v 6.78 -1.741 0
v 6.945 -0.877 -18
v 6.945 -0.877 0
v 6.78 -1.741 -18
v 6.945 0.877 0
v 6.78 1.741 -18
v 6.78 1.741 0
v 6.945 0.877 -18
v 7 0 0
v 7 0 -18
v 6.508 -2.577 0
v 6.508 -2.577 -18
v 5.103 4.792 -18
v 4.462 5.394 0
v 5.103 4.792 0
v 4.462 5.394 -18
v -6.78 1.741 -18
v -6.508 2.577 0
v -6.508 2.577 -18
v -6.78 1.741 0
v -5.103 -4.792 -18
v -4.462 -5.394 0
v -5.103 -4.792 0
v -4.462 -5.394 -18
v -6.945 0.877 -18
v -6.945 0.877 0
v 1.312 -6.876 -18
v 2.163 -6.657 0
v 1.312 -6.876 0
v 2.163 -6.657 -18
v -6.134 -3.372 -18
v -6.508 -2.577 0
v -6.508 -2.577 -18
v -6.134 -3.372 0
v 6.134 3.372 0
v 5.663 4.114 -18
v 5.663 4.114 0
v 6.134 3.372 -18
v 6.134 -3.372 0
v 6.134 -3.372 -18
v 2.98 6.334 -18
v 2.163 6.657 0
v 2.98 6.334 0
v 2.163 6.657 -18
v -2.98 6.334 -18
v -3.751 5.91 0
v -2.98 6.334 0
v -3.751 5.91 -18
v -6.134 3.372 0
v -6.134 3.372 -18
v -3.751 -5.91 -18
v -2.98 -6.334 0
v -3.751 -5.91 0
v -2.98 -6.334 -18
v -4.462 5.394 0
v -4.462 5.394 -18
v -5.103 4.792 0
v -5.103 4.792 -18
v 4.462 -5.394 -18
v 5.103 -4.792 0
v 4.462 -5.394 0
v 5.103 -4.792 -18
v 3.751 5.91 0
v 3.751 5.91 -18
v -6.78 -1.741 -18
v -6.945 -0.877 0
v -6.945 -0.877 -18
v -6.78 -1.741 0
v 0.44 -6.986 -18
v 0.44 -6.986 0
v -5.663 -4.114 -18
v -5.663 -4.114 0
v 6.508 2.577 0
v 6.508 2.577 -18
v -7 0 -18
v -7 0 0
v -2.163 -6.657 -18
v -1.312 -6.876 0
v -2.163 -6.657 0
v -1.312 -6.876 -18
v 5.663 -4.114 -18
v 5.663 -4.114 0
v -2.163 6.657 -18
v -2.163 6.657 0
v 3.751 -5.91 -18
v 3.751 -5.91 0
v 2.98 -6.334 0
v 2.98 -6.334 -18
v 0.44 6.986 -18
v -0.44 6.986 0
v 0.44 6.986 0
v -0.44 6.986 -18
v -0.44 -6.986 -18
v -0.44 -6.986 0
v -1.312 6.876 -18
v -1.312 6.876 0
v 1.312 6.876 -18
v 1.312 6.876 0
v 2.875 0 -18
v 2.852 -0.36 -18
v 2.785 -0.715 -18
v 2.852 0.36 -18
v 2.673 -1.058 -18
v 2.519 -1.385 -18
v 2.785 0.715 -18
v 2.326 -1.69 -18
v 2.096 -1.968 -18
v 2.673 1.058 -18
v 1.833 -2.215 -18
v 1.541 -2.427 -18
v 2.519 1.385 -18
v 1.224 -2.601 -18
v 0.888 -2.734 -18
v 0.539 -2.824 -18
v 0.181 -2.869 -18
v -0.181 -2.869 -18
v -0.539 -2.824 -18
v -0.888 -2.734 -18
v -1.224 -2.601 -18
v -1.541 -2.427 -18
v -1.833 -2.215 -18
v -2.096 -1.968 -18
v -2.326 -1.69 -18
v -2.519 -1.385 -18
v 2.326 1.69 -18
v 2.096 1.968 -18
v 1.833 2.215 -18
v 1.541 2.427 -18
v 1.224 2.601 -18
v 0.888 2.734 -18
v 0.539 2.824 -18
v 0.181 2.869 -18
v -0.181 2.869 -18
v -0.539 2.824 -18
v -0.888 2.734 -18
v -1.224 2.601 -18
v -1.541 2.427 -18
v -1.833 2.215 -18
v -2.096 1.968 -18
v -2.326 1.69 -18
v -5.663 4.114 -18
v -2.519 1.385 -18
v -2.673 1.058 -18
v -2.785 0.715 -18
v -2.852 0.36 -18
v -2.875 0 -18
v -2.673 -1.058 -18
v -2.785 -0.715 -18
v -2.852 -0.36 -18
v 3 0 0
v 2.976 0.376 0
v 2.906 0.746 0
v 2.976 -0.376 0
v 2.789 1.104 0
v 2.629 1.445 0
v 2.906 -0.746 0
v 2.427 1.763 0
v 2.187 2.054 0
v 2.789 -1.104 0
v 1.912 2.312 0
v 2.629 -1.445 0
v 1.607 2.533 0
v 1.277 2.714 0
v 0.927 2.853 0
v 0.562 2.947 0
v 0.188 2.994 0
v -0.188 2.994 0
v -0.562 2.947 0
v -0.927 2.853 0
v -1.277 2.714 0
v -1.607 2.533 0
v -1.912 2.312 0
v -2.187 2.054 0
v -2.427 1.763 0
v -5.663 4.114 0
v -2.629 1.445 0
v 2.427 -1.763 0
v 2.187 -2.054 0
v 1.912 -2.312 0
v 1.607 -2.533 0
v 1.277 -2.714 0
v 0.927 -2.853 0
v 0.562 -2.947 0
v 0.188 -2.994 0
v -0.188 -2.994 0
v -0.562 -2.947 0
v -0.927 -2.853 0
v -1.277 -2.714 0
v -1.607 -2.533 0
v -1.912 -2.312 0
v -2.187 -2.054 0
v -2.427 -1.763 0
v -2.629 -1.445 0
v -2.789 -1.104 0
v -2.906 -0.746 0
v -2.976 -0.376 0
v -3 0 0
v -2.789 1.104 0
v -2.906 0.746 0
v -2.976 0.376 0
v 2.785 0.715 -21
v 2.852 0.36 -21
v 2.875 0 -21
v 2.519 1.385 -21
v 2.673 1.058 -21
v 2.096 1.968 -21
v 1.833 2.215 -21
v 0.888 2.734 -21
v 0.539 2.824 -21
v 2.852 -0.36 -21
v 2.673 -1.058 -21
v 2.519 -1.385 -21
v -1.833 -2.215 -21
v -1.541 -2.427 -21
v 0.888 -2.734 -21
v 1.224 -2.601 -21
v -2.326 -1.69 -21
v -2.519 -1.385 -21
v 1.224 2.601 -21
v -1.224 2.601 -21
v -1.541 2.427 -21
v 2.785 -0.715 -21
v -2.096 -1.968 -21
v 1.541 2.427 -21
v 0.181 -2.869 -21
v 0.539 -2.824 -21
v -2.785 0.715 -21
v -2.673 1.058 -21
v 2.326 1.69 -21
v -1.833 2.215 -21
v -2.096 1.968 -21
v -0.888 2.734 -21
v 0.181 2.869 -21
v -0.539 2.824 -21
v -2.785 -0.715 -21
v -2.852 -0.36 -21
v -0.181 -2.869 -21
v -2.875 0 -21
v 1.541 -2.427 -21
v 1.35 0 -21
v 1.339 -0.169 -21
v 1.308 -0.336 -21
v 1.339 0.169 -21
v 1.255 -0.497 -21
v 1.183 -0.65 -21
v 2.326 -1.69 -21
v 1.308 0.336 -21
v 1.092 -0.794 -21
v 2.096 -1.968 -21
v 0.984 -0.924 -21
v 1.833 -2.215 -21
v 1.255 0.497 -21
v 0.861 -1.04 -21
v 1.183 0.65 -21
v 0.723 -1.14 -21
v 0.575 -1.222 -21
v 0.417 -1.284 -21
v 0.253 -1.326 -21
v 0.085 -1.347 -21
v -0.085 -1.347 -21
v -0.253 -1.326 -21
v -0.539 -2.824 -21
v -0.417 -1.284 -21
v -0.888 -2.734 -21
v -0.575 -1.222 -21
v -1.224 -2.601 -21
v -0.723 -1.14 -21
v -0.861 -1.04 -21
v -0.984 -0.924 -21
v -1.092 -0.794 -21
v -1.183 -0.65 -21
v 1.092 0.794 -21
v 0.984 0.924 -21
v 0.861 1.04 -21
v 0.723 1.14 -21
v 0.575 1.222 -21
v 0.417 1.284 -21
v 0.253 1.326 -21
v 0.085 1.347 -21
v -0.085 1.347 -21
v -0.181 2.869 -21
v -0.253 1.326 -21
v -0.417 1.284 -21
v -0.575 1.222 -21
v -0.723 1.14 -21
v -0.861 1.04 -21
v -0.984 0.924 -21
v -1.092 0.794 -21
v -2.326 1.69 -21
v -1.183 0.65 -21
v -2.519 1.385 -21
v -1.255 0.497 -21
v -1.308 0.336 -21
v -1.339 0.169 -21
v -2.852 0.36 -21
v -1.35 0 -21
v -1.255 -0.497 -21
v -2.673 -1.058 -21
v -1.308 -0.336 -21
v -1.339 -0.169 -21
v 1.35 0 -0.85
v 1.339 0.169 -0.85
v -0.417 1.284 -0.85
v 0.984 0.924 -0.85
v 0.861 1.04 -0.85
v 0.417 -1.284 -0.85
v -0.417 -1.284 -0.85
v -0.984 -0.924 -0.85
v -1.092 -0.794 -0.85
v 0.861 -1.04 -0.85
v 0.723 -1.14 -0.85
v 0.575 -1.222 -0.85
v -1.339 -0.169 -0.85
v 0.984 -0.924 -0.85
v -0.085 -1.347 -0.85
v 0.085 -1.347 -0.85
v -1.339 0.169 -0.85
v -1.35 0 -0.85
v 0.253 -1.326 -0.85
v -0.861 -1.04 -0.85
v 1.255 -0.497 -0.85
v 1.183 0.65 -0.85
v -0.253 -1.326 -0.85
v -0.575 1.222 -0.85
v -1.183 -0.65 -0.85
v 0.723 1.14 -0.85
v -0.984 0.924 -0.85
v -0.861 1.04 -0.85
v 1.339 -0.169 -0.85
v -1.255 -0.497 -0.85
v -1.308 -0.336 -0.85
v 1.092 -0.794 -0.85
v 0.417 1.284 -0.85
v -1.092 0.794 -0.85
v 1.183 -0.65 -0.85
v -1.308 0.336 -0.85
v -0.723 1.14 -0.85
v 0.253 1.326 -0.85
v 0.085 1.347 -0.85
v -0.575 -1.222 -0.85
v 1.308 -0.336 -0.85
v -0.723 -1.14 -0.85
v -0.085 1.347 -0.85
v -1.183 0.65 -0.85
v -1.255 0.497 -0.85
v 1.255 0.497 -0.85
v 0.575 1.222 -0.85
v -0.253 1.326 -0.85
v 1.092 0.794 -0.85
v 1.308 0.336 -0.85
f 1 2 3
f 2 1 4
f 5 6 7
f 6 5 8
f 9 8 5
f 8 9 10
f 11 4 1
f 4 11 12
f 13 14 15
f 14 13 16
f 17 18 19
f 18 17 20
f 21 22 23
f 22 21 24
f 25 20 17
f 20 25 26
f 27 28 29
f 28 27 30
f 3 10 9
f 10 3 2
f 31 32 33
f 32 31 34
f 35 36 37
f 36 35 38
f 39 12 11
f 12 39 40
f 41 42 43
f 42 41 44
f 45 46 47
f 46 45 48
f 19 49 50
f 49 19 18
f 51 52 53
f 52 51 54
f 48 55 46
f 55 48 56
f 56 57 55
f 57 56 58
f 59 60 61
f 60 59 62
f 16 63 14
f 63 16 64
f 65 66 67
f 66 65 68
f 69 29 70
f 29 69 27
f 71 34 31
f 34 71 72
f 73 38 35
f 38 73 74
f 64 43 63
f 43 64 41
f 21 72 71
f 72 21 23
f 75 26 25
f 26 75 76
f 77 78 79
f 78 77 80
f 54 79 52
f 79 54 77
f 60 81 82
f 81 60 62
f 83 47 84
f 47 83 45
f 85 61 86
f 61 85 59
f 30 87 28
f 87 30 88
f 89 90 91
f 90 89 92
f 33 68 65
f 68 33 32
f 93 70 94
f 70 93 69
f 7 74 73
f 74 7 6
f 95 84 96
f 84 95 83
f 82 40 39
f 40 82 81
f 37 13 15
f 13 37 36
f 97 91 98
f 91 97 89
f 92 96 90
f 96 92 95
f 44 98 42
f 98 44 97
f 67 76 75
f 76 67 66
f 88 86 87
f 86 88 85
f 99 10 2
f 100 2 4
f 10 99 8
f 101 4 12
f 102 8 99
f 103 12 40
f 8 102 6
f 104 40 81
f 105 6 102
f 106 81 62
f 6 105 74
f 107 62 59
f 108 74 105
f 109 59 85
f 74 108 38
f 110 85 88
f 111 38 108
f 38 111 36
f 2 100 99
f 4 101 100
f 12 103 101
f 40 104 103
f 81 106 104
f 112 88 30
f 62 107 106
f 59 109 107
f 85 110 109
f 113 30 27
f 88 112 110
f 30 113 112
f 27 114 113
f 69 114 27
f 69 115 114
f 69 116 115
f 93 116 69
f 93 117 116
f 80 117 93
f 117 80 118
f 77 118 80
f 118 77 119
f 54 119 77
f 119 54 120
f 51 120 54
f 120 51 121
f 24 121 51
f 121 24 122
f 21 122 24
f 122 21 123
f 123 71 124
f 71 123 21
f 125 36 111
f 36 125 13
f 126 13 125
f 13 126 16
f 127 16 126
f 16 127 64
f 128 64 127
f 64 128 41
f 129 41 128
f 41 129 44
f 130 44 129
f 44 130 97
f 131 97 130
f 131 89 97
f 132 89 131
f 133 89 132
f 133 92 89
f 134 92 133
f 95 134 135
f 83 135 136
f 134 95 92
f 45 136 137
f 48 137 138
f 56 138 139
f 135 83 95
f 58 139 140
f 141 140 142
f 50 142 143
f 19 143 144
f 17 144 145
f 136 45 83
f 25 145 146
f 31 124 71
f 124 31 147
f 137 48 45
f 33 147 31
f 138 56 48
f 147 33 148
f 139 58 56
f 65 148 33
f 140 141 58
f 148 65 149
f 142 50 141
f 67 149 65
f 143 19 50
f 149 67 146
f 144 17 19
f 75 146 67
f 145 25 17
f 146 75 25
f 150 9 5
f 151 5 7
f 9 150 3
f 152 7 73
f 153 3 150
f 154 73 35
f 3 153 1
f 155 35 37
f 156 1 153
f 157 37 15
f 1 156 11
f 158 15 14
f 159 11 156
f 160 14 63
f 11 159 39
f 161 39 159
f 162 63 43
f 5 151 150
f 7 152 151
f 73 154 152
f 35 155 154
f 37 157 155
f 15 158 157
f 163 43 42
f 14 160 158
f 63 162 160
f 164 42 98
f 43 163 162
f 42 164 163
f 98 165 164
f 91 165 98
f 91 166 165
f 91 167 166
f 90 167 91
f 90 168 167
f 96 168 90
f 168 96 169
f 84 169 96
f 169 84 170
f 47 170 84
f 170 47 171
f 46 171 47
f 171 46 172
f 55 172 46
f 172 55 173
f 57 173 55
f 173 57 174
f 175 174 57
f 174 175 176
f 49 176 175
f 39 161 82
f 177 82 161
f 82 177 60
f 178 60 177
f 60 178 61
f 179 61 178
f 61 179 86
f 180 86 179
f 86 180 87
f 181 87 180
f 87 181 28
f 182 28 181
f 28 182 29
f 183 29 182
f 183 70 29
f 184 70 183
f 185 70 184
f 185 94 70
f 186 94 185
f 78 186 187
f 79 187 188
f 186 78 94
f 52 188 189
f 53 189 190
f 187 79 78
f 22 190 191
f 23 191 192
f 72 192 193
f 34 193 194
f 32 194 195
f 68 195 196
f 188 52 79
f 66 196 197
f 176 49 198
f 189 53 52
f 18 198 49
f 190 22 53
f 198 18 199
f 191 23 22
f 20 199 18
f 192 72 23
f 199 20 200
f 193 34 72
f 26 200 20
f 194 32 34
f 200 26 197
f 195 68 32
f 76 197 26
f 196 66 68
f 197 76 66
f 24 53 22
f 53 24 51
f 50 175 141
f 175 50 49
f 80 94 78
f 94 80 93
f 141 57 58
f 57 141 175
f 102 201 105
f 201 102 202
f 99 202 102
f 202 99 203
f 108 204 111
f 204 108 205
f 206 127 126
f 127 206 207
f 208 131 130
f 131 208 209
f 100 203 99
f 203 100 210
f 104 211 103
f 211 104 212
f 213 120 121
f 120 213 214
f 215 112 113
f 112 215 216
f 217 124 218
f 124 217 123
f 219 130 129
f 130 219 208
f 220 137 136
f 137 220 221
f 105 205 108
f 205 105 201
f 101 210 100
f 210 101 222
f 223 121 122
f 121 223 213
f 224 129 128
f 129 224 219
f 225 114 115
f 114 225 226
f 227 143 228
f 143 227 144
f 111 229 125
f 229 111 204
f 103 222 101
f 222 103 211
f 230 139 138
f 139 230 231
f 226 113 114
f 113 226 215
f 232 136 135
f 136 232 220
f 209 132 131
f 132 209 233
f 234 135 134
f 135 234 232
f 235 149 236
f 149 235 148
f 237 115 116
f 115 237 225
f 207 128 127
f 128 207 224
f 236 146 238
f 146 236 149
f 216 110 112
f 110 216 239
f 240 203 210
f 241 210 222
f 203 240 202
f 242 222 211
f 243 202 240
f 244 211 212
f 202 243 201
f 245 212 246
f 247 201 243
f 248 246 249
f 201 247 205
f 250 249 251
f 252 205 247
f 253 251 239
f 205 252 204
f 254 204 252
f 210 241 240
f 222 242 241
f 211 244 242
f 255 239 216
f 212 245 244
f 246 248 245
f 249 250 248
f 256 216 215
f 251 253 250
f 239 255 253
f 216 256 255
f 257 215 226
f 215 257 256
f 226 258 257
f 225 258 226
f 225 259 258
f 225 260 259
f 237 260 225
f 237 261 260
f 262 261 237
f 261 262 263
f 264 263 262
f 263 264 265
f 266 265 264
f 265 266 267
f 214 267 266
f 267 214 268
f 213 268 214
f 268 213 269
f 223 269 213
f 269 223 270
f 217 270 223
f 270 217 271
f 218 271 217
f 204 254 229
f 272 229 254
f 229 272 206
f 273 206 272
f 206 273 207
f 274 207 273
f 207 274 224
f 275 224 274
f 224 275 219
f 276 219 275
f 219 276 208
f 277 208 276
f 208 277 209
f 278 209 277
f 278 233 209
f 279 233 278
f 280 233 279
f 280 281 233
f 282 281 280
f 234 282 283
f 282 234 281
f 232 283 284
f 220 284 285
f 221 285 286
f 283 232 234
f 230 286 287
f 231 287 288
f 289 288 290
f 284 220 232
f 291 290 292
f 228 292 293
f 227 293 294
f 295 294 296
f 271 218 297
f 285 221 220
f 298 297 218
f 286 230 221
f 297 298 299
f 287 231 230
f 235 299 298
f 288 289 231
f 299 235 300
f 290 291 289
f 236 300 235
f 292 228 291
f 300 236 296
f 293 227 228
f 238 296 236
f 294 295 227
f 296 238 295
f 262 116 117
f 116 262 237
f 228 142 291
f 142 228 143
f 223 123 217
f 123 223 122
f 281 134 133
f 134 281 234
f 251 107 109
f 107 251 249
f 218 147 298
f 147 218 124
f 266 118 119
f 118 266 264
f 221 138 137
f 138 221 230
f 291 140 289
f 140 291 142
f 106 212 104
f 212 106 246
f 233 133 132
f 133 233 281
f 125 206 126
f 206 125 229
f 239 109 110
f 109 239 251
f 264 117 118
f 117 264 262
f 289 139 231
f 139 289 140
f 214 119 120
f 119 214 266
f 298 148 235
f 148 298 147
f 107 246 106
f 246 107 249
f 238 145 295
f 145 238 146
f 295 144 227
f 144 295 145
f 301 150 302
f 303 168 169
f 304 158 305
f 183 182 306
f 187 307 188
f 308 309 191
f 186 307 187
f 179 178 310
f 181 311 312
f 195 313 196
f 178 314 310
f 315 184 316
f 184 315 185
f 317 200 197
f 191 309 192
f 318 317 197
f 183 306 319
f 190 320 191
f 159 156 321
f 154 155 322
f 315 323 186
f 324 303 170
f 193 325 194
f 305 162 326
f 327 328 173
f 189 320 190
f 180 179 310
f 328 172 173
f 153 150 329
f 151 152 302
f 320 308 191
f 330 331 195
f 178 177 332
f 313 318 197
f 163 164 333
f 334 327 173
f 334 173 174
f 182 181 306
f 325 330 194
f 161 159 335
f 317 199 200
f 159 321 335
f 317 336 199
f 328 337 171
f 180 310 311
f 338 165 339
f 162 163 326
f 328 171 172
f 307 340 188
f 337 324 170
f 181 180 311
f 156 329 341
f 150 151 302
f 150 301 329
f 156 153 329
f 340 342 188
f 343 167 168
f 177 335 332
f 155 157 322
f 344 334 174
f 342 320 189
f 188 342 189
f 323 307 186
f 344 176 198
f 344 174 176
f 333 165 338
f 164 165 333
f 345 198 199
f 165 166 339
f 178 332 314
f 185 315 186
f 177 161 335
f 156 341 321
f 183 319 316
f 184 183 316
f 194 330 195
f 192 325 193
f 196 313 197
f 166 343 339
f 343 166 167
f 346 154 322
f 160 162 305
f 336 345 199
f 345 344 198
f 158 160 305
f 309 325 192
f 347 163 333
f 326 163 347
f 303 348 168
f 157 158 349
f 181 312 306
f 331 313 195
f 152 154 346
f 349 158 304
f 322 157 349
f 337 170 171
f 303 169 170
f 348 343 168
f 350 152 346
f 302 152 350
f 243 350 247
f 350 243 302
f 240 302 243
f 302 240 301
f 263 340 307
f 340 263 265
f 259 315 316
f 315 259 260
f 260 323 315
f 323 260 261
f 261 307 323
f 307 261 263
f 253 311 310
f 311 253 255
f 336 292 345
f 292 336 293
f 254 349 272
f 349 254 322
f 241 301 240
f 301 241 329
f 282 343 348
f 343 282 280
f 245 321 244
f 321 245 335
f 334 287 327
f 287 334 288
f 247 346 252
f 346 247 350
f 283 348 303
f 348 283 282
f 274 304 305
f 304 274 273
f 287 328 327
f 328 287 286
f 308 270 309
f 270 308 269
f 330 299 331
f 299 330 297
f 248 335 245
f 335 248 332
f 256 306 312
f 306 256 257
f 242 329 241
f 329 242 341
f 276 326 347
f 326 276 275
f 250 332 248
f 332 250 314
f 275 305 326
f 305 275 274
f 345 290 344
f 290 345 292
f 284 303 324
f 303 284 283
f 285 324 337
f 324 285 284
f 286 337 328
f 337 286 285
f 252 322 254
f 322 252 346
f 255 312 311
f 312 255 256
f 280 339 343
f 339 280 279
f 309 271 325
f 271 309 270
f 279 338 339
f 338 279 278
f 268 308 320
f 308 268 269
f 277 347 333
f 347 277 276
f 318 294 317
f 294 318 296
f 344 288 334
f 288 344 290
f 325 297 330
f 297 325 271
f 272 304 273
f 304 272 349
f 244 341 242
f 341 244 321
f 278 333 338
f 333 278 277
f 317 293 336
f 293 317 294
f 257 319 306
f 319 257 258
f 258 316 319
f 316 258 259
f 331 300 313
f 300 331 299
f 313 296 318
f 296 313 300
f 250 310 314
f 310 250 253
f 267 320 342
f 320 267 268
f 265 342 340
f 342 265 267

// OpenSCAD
$fn = 50;

difference() {
	union() {
		translate(v = [0, 0, -18.0]) {
			cylinder(h = 18, r = 7.0);
		}
		#translate(v = [0, 0, -21.0]) {
			cylinder(h = 21, r = 2.875);
		}
	}
	union() {
		translate(v = [0, 0, 0]) {
			rotate(a = [0, 0, 0]) {
				difference() {
					union() {
						translate(v = [0, 0, -21.0]) {
							cylinder(h = 21, r = 1.0);
						}
						translate(v = [0, 0, -0.85]) {
							cylinder(h = 0.85, r1 = 1.35, r2 = 3.0);
						}
						translate(v = [0, 0, -21.0]) {
							cylinder(h = 21, r = 1.35);
						}
						translate(v = [0, 0, -21.0]) {
							cylinder(h = 21, r = 1.0);
						}
					}
					union();
				}
			}
		}
	}
}
